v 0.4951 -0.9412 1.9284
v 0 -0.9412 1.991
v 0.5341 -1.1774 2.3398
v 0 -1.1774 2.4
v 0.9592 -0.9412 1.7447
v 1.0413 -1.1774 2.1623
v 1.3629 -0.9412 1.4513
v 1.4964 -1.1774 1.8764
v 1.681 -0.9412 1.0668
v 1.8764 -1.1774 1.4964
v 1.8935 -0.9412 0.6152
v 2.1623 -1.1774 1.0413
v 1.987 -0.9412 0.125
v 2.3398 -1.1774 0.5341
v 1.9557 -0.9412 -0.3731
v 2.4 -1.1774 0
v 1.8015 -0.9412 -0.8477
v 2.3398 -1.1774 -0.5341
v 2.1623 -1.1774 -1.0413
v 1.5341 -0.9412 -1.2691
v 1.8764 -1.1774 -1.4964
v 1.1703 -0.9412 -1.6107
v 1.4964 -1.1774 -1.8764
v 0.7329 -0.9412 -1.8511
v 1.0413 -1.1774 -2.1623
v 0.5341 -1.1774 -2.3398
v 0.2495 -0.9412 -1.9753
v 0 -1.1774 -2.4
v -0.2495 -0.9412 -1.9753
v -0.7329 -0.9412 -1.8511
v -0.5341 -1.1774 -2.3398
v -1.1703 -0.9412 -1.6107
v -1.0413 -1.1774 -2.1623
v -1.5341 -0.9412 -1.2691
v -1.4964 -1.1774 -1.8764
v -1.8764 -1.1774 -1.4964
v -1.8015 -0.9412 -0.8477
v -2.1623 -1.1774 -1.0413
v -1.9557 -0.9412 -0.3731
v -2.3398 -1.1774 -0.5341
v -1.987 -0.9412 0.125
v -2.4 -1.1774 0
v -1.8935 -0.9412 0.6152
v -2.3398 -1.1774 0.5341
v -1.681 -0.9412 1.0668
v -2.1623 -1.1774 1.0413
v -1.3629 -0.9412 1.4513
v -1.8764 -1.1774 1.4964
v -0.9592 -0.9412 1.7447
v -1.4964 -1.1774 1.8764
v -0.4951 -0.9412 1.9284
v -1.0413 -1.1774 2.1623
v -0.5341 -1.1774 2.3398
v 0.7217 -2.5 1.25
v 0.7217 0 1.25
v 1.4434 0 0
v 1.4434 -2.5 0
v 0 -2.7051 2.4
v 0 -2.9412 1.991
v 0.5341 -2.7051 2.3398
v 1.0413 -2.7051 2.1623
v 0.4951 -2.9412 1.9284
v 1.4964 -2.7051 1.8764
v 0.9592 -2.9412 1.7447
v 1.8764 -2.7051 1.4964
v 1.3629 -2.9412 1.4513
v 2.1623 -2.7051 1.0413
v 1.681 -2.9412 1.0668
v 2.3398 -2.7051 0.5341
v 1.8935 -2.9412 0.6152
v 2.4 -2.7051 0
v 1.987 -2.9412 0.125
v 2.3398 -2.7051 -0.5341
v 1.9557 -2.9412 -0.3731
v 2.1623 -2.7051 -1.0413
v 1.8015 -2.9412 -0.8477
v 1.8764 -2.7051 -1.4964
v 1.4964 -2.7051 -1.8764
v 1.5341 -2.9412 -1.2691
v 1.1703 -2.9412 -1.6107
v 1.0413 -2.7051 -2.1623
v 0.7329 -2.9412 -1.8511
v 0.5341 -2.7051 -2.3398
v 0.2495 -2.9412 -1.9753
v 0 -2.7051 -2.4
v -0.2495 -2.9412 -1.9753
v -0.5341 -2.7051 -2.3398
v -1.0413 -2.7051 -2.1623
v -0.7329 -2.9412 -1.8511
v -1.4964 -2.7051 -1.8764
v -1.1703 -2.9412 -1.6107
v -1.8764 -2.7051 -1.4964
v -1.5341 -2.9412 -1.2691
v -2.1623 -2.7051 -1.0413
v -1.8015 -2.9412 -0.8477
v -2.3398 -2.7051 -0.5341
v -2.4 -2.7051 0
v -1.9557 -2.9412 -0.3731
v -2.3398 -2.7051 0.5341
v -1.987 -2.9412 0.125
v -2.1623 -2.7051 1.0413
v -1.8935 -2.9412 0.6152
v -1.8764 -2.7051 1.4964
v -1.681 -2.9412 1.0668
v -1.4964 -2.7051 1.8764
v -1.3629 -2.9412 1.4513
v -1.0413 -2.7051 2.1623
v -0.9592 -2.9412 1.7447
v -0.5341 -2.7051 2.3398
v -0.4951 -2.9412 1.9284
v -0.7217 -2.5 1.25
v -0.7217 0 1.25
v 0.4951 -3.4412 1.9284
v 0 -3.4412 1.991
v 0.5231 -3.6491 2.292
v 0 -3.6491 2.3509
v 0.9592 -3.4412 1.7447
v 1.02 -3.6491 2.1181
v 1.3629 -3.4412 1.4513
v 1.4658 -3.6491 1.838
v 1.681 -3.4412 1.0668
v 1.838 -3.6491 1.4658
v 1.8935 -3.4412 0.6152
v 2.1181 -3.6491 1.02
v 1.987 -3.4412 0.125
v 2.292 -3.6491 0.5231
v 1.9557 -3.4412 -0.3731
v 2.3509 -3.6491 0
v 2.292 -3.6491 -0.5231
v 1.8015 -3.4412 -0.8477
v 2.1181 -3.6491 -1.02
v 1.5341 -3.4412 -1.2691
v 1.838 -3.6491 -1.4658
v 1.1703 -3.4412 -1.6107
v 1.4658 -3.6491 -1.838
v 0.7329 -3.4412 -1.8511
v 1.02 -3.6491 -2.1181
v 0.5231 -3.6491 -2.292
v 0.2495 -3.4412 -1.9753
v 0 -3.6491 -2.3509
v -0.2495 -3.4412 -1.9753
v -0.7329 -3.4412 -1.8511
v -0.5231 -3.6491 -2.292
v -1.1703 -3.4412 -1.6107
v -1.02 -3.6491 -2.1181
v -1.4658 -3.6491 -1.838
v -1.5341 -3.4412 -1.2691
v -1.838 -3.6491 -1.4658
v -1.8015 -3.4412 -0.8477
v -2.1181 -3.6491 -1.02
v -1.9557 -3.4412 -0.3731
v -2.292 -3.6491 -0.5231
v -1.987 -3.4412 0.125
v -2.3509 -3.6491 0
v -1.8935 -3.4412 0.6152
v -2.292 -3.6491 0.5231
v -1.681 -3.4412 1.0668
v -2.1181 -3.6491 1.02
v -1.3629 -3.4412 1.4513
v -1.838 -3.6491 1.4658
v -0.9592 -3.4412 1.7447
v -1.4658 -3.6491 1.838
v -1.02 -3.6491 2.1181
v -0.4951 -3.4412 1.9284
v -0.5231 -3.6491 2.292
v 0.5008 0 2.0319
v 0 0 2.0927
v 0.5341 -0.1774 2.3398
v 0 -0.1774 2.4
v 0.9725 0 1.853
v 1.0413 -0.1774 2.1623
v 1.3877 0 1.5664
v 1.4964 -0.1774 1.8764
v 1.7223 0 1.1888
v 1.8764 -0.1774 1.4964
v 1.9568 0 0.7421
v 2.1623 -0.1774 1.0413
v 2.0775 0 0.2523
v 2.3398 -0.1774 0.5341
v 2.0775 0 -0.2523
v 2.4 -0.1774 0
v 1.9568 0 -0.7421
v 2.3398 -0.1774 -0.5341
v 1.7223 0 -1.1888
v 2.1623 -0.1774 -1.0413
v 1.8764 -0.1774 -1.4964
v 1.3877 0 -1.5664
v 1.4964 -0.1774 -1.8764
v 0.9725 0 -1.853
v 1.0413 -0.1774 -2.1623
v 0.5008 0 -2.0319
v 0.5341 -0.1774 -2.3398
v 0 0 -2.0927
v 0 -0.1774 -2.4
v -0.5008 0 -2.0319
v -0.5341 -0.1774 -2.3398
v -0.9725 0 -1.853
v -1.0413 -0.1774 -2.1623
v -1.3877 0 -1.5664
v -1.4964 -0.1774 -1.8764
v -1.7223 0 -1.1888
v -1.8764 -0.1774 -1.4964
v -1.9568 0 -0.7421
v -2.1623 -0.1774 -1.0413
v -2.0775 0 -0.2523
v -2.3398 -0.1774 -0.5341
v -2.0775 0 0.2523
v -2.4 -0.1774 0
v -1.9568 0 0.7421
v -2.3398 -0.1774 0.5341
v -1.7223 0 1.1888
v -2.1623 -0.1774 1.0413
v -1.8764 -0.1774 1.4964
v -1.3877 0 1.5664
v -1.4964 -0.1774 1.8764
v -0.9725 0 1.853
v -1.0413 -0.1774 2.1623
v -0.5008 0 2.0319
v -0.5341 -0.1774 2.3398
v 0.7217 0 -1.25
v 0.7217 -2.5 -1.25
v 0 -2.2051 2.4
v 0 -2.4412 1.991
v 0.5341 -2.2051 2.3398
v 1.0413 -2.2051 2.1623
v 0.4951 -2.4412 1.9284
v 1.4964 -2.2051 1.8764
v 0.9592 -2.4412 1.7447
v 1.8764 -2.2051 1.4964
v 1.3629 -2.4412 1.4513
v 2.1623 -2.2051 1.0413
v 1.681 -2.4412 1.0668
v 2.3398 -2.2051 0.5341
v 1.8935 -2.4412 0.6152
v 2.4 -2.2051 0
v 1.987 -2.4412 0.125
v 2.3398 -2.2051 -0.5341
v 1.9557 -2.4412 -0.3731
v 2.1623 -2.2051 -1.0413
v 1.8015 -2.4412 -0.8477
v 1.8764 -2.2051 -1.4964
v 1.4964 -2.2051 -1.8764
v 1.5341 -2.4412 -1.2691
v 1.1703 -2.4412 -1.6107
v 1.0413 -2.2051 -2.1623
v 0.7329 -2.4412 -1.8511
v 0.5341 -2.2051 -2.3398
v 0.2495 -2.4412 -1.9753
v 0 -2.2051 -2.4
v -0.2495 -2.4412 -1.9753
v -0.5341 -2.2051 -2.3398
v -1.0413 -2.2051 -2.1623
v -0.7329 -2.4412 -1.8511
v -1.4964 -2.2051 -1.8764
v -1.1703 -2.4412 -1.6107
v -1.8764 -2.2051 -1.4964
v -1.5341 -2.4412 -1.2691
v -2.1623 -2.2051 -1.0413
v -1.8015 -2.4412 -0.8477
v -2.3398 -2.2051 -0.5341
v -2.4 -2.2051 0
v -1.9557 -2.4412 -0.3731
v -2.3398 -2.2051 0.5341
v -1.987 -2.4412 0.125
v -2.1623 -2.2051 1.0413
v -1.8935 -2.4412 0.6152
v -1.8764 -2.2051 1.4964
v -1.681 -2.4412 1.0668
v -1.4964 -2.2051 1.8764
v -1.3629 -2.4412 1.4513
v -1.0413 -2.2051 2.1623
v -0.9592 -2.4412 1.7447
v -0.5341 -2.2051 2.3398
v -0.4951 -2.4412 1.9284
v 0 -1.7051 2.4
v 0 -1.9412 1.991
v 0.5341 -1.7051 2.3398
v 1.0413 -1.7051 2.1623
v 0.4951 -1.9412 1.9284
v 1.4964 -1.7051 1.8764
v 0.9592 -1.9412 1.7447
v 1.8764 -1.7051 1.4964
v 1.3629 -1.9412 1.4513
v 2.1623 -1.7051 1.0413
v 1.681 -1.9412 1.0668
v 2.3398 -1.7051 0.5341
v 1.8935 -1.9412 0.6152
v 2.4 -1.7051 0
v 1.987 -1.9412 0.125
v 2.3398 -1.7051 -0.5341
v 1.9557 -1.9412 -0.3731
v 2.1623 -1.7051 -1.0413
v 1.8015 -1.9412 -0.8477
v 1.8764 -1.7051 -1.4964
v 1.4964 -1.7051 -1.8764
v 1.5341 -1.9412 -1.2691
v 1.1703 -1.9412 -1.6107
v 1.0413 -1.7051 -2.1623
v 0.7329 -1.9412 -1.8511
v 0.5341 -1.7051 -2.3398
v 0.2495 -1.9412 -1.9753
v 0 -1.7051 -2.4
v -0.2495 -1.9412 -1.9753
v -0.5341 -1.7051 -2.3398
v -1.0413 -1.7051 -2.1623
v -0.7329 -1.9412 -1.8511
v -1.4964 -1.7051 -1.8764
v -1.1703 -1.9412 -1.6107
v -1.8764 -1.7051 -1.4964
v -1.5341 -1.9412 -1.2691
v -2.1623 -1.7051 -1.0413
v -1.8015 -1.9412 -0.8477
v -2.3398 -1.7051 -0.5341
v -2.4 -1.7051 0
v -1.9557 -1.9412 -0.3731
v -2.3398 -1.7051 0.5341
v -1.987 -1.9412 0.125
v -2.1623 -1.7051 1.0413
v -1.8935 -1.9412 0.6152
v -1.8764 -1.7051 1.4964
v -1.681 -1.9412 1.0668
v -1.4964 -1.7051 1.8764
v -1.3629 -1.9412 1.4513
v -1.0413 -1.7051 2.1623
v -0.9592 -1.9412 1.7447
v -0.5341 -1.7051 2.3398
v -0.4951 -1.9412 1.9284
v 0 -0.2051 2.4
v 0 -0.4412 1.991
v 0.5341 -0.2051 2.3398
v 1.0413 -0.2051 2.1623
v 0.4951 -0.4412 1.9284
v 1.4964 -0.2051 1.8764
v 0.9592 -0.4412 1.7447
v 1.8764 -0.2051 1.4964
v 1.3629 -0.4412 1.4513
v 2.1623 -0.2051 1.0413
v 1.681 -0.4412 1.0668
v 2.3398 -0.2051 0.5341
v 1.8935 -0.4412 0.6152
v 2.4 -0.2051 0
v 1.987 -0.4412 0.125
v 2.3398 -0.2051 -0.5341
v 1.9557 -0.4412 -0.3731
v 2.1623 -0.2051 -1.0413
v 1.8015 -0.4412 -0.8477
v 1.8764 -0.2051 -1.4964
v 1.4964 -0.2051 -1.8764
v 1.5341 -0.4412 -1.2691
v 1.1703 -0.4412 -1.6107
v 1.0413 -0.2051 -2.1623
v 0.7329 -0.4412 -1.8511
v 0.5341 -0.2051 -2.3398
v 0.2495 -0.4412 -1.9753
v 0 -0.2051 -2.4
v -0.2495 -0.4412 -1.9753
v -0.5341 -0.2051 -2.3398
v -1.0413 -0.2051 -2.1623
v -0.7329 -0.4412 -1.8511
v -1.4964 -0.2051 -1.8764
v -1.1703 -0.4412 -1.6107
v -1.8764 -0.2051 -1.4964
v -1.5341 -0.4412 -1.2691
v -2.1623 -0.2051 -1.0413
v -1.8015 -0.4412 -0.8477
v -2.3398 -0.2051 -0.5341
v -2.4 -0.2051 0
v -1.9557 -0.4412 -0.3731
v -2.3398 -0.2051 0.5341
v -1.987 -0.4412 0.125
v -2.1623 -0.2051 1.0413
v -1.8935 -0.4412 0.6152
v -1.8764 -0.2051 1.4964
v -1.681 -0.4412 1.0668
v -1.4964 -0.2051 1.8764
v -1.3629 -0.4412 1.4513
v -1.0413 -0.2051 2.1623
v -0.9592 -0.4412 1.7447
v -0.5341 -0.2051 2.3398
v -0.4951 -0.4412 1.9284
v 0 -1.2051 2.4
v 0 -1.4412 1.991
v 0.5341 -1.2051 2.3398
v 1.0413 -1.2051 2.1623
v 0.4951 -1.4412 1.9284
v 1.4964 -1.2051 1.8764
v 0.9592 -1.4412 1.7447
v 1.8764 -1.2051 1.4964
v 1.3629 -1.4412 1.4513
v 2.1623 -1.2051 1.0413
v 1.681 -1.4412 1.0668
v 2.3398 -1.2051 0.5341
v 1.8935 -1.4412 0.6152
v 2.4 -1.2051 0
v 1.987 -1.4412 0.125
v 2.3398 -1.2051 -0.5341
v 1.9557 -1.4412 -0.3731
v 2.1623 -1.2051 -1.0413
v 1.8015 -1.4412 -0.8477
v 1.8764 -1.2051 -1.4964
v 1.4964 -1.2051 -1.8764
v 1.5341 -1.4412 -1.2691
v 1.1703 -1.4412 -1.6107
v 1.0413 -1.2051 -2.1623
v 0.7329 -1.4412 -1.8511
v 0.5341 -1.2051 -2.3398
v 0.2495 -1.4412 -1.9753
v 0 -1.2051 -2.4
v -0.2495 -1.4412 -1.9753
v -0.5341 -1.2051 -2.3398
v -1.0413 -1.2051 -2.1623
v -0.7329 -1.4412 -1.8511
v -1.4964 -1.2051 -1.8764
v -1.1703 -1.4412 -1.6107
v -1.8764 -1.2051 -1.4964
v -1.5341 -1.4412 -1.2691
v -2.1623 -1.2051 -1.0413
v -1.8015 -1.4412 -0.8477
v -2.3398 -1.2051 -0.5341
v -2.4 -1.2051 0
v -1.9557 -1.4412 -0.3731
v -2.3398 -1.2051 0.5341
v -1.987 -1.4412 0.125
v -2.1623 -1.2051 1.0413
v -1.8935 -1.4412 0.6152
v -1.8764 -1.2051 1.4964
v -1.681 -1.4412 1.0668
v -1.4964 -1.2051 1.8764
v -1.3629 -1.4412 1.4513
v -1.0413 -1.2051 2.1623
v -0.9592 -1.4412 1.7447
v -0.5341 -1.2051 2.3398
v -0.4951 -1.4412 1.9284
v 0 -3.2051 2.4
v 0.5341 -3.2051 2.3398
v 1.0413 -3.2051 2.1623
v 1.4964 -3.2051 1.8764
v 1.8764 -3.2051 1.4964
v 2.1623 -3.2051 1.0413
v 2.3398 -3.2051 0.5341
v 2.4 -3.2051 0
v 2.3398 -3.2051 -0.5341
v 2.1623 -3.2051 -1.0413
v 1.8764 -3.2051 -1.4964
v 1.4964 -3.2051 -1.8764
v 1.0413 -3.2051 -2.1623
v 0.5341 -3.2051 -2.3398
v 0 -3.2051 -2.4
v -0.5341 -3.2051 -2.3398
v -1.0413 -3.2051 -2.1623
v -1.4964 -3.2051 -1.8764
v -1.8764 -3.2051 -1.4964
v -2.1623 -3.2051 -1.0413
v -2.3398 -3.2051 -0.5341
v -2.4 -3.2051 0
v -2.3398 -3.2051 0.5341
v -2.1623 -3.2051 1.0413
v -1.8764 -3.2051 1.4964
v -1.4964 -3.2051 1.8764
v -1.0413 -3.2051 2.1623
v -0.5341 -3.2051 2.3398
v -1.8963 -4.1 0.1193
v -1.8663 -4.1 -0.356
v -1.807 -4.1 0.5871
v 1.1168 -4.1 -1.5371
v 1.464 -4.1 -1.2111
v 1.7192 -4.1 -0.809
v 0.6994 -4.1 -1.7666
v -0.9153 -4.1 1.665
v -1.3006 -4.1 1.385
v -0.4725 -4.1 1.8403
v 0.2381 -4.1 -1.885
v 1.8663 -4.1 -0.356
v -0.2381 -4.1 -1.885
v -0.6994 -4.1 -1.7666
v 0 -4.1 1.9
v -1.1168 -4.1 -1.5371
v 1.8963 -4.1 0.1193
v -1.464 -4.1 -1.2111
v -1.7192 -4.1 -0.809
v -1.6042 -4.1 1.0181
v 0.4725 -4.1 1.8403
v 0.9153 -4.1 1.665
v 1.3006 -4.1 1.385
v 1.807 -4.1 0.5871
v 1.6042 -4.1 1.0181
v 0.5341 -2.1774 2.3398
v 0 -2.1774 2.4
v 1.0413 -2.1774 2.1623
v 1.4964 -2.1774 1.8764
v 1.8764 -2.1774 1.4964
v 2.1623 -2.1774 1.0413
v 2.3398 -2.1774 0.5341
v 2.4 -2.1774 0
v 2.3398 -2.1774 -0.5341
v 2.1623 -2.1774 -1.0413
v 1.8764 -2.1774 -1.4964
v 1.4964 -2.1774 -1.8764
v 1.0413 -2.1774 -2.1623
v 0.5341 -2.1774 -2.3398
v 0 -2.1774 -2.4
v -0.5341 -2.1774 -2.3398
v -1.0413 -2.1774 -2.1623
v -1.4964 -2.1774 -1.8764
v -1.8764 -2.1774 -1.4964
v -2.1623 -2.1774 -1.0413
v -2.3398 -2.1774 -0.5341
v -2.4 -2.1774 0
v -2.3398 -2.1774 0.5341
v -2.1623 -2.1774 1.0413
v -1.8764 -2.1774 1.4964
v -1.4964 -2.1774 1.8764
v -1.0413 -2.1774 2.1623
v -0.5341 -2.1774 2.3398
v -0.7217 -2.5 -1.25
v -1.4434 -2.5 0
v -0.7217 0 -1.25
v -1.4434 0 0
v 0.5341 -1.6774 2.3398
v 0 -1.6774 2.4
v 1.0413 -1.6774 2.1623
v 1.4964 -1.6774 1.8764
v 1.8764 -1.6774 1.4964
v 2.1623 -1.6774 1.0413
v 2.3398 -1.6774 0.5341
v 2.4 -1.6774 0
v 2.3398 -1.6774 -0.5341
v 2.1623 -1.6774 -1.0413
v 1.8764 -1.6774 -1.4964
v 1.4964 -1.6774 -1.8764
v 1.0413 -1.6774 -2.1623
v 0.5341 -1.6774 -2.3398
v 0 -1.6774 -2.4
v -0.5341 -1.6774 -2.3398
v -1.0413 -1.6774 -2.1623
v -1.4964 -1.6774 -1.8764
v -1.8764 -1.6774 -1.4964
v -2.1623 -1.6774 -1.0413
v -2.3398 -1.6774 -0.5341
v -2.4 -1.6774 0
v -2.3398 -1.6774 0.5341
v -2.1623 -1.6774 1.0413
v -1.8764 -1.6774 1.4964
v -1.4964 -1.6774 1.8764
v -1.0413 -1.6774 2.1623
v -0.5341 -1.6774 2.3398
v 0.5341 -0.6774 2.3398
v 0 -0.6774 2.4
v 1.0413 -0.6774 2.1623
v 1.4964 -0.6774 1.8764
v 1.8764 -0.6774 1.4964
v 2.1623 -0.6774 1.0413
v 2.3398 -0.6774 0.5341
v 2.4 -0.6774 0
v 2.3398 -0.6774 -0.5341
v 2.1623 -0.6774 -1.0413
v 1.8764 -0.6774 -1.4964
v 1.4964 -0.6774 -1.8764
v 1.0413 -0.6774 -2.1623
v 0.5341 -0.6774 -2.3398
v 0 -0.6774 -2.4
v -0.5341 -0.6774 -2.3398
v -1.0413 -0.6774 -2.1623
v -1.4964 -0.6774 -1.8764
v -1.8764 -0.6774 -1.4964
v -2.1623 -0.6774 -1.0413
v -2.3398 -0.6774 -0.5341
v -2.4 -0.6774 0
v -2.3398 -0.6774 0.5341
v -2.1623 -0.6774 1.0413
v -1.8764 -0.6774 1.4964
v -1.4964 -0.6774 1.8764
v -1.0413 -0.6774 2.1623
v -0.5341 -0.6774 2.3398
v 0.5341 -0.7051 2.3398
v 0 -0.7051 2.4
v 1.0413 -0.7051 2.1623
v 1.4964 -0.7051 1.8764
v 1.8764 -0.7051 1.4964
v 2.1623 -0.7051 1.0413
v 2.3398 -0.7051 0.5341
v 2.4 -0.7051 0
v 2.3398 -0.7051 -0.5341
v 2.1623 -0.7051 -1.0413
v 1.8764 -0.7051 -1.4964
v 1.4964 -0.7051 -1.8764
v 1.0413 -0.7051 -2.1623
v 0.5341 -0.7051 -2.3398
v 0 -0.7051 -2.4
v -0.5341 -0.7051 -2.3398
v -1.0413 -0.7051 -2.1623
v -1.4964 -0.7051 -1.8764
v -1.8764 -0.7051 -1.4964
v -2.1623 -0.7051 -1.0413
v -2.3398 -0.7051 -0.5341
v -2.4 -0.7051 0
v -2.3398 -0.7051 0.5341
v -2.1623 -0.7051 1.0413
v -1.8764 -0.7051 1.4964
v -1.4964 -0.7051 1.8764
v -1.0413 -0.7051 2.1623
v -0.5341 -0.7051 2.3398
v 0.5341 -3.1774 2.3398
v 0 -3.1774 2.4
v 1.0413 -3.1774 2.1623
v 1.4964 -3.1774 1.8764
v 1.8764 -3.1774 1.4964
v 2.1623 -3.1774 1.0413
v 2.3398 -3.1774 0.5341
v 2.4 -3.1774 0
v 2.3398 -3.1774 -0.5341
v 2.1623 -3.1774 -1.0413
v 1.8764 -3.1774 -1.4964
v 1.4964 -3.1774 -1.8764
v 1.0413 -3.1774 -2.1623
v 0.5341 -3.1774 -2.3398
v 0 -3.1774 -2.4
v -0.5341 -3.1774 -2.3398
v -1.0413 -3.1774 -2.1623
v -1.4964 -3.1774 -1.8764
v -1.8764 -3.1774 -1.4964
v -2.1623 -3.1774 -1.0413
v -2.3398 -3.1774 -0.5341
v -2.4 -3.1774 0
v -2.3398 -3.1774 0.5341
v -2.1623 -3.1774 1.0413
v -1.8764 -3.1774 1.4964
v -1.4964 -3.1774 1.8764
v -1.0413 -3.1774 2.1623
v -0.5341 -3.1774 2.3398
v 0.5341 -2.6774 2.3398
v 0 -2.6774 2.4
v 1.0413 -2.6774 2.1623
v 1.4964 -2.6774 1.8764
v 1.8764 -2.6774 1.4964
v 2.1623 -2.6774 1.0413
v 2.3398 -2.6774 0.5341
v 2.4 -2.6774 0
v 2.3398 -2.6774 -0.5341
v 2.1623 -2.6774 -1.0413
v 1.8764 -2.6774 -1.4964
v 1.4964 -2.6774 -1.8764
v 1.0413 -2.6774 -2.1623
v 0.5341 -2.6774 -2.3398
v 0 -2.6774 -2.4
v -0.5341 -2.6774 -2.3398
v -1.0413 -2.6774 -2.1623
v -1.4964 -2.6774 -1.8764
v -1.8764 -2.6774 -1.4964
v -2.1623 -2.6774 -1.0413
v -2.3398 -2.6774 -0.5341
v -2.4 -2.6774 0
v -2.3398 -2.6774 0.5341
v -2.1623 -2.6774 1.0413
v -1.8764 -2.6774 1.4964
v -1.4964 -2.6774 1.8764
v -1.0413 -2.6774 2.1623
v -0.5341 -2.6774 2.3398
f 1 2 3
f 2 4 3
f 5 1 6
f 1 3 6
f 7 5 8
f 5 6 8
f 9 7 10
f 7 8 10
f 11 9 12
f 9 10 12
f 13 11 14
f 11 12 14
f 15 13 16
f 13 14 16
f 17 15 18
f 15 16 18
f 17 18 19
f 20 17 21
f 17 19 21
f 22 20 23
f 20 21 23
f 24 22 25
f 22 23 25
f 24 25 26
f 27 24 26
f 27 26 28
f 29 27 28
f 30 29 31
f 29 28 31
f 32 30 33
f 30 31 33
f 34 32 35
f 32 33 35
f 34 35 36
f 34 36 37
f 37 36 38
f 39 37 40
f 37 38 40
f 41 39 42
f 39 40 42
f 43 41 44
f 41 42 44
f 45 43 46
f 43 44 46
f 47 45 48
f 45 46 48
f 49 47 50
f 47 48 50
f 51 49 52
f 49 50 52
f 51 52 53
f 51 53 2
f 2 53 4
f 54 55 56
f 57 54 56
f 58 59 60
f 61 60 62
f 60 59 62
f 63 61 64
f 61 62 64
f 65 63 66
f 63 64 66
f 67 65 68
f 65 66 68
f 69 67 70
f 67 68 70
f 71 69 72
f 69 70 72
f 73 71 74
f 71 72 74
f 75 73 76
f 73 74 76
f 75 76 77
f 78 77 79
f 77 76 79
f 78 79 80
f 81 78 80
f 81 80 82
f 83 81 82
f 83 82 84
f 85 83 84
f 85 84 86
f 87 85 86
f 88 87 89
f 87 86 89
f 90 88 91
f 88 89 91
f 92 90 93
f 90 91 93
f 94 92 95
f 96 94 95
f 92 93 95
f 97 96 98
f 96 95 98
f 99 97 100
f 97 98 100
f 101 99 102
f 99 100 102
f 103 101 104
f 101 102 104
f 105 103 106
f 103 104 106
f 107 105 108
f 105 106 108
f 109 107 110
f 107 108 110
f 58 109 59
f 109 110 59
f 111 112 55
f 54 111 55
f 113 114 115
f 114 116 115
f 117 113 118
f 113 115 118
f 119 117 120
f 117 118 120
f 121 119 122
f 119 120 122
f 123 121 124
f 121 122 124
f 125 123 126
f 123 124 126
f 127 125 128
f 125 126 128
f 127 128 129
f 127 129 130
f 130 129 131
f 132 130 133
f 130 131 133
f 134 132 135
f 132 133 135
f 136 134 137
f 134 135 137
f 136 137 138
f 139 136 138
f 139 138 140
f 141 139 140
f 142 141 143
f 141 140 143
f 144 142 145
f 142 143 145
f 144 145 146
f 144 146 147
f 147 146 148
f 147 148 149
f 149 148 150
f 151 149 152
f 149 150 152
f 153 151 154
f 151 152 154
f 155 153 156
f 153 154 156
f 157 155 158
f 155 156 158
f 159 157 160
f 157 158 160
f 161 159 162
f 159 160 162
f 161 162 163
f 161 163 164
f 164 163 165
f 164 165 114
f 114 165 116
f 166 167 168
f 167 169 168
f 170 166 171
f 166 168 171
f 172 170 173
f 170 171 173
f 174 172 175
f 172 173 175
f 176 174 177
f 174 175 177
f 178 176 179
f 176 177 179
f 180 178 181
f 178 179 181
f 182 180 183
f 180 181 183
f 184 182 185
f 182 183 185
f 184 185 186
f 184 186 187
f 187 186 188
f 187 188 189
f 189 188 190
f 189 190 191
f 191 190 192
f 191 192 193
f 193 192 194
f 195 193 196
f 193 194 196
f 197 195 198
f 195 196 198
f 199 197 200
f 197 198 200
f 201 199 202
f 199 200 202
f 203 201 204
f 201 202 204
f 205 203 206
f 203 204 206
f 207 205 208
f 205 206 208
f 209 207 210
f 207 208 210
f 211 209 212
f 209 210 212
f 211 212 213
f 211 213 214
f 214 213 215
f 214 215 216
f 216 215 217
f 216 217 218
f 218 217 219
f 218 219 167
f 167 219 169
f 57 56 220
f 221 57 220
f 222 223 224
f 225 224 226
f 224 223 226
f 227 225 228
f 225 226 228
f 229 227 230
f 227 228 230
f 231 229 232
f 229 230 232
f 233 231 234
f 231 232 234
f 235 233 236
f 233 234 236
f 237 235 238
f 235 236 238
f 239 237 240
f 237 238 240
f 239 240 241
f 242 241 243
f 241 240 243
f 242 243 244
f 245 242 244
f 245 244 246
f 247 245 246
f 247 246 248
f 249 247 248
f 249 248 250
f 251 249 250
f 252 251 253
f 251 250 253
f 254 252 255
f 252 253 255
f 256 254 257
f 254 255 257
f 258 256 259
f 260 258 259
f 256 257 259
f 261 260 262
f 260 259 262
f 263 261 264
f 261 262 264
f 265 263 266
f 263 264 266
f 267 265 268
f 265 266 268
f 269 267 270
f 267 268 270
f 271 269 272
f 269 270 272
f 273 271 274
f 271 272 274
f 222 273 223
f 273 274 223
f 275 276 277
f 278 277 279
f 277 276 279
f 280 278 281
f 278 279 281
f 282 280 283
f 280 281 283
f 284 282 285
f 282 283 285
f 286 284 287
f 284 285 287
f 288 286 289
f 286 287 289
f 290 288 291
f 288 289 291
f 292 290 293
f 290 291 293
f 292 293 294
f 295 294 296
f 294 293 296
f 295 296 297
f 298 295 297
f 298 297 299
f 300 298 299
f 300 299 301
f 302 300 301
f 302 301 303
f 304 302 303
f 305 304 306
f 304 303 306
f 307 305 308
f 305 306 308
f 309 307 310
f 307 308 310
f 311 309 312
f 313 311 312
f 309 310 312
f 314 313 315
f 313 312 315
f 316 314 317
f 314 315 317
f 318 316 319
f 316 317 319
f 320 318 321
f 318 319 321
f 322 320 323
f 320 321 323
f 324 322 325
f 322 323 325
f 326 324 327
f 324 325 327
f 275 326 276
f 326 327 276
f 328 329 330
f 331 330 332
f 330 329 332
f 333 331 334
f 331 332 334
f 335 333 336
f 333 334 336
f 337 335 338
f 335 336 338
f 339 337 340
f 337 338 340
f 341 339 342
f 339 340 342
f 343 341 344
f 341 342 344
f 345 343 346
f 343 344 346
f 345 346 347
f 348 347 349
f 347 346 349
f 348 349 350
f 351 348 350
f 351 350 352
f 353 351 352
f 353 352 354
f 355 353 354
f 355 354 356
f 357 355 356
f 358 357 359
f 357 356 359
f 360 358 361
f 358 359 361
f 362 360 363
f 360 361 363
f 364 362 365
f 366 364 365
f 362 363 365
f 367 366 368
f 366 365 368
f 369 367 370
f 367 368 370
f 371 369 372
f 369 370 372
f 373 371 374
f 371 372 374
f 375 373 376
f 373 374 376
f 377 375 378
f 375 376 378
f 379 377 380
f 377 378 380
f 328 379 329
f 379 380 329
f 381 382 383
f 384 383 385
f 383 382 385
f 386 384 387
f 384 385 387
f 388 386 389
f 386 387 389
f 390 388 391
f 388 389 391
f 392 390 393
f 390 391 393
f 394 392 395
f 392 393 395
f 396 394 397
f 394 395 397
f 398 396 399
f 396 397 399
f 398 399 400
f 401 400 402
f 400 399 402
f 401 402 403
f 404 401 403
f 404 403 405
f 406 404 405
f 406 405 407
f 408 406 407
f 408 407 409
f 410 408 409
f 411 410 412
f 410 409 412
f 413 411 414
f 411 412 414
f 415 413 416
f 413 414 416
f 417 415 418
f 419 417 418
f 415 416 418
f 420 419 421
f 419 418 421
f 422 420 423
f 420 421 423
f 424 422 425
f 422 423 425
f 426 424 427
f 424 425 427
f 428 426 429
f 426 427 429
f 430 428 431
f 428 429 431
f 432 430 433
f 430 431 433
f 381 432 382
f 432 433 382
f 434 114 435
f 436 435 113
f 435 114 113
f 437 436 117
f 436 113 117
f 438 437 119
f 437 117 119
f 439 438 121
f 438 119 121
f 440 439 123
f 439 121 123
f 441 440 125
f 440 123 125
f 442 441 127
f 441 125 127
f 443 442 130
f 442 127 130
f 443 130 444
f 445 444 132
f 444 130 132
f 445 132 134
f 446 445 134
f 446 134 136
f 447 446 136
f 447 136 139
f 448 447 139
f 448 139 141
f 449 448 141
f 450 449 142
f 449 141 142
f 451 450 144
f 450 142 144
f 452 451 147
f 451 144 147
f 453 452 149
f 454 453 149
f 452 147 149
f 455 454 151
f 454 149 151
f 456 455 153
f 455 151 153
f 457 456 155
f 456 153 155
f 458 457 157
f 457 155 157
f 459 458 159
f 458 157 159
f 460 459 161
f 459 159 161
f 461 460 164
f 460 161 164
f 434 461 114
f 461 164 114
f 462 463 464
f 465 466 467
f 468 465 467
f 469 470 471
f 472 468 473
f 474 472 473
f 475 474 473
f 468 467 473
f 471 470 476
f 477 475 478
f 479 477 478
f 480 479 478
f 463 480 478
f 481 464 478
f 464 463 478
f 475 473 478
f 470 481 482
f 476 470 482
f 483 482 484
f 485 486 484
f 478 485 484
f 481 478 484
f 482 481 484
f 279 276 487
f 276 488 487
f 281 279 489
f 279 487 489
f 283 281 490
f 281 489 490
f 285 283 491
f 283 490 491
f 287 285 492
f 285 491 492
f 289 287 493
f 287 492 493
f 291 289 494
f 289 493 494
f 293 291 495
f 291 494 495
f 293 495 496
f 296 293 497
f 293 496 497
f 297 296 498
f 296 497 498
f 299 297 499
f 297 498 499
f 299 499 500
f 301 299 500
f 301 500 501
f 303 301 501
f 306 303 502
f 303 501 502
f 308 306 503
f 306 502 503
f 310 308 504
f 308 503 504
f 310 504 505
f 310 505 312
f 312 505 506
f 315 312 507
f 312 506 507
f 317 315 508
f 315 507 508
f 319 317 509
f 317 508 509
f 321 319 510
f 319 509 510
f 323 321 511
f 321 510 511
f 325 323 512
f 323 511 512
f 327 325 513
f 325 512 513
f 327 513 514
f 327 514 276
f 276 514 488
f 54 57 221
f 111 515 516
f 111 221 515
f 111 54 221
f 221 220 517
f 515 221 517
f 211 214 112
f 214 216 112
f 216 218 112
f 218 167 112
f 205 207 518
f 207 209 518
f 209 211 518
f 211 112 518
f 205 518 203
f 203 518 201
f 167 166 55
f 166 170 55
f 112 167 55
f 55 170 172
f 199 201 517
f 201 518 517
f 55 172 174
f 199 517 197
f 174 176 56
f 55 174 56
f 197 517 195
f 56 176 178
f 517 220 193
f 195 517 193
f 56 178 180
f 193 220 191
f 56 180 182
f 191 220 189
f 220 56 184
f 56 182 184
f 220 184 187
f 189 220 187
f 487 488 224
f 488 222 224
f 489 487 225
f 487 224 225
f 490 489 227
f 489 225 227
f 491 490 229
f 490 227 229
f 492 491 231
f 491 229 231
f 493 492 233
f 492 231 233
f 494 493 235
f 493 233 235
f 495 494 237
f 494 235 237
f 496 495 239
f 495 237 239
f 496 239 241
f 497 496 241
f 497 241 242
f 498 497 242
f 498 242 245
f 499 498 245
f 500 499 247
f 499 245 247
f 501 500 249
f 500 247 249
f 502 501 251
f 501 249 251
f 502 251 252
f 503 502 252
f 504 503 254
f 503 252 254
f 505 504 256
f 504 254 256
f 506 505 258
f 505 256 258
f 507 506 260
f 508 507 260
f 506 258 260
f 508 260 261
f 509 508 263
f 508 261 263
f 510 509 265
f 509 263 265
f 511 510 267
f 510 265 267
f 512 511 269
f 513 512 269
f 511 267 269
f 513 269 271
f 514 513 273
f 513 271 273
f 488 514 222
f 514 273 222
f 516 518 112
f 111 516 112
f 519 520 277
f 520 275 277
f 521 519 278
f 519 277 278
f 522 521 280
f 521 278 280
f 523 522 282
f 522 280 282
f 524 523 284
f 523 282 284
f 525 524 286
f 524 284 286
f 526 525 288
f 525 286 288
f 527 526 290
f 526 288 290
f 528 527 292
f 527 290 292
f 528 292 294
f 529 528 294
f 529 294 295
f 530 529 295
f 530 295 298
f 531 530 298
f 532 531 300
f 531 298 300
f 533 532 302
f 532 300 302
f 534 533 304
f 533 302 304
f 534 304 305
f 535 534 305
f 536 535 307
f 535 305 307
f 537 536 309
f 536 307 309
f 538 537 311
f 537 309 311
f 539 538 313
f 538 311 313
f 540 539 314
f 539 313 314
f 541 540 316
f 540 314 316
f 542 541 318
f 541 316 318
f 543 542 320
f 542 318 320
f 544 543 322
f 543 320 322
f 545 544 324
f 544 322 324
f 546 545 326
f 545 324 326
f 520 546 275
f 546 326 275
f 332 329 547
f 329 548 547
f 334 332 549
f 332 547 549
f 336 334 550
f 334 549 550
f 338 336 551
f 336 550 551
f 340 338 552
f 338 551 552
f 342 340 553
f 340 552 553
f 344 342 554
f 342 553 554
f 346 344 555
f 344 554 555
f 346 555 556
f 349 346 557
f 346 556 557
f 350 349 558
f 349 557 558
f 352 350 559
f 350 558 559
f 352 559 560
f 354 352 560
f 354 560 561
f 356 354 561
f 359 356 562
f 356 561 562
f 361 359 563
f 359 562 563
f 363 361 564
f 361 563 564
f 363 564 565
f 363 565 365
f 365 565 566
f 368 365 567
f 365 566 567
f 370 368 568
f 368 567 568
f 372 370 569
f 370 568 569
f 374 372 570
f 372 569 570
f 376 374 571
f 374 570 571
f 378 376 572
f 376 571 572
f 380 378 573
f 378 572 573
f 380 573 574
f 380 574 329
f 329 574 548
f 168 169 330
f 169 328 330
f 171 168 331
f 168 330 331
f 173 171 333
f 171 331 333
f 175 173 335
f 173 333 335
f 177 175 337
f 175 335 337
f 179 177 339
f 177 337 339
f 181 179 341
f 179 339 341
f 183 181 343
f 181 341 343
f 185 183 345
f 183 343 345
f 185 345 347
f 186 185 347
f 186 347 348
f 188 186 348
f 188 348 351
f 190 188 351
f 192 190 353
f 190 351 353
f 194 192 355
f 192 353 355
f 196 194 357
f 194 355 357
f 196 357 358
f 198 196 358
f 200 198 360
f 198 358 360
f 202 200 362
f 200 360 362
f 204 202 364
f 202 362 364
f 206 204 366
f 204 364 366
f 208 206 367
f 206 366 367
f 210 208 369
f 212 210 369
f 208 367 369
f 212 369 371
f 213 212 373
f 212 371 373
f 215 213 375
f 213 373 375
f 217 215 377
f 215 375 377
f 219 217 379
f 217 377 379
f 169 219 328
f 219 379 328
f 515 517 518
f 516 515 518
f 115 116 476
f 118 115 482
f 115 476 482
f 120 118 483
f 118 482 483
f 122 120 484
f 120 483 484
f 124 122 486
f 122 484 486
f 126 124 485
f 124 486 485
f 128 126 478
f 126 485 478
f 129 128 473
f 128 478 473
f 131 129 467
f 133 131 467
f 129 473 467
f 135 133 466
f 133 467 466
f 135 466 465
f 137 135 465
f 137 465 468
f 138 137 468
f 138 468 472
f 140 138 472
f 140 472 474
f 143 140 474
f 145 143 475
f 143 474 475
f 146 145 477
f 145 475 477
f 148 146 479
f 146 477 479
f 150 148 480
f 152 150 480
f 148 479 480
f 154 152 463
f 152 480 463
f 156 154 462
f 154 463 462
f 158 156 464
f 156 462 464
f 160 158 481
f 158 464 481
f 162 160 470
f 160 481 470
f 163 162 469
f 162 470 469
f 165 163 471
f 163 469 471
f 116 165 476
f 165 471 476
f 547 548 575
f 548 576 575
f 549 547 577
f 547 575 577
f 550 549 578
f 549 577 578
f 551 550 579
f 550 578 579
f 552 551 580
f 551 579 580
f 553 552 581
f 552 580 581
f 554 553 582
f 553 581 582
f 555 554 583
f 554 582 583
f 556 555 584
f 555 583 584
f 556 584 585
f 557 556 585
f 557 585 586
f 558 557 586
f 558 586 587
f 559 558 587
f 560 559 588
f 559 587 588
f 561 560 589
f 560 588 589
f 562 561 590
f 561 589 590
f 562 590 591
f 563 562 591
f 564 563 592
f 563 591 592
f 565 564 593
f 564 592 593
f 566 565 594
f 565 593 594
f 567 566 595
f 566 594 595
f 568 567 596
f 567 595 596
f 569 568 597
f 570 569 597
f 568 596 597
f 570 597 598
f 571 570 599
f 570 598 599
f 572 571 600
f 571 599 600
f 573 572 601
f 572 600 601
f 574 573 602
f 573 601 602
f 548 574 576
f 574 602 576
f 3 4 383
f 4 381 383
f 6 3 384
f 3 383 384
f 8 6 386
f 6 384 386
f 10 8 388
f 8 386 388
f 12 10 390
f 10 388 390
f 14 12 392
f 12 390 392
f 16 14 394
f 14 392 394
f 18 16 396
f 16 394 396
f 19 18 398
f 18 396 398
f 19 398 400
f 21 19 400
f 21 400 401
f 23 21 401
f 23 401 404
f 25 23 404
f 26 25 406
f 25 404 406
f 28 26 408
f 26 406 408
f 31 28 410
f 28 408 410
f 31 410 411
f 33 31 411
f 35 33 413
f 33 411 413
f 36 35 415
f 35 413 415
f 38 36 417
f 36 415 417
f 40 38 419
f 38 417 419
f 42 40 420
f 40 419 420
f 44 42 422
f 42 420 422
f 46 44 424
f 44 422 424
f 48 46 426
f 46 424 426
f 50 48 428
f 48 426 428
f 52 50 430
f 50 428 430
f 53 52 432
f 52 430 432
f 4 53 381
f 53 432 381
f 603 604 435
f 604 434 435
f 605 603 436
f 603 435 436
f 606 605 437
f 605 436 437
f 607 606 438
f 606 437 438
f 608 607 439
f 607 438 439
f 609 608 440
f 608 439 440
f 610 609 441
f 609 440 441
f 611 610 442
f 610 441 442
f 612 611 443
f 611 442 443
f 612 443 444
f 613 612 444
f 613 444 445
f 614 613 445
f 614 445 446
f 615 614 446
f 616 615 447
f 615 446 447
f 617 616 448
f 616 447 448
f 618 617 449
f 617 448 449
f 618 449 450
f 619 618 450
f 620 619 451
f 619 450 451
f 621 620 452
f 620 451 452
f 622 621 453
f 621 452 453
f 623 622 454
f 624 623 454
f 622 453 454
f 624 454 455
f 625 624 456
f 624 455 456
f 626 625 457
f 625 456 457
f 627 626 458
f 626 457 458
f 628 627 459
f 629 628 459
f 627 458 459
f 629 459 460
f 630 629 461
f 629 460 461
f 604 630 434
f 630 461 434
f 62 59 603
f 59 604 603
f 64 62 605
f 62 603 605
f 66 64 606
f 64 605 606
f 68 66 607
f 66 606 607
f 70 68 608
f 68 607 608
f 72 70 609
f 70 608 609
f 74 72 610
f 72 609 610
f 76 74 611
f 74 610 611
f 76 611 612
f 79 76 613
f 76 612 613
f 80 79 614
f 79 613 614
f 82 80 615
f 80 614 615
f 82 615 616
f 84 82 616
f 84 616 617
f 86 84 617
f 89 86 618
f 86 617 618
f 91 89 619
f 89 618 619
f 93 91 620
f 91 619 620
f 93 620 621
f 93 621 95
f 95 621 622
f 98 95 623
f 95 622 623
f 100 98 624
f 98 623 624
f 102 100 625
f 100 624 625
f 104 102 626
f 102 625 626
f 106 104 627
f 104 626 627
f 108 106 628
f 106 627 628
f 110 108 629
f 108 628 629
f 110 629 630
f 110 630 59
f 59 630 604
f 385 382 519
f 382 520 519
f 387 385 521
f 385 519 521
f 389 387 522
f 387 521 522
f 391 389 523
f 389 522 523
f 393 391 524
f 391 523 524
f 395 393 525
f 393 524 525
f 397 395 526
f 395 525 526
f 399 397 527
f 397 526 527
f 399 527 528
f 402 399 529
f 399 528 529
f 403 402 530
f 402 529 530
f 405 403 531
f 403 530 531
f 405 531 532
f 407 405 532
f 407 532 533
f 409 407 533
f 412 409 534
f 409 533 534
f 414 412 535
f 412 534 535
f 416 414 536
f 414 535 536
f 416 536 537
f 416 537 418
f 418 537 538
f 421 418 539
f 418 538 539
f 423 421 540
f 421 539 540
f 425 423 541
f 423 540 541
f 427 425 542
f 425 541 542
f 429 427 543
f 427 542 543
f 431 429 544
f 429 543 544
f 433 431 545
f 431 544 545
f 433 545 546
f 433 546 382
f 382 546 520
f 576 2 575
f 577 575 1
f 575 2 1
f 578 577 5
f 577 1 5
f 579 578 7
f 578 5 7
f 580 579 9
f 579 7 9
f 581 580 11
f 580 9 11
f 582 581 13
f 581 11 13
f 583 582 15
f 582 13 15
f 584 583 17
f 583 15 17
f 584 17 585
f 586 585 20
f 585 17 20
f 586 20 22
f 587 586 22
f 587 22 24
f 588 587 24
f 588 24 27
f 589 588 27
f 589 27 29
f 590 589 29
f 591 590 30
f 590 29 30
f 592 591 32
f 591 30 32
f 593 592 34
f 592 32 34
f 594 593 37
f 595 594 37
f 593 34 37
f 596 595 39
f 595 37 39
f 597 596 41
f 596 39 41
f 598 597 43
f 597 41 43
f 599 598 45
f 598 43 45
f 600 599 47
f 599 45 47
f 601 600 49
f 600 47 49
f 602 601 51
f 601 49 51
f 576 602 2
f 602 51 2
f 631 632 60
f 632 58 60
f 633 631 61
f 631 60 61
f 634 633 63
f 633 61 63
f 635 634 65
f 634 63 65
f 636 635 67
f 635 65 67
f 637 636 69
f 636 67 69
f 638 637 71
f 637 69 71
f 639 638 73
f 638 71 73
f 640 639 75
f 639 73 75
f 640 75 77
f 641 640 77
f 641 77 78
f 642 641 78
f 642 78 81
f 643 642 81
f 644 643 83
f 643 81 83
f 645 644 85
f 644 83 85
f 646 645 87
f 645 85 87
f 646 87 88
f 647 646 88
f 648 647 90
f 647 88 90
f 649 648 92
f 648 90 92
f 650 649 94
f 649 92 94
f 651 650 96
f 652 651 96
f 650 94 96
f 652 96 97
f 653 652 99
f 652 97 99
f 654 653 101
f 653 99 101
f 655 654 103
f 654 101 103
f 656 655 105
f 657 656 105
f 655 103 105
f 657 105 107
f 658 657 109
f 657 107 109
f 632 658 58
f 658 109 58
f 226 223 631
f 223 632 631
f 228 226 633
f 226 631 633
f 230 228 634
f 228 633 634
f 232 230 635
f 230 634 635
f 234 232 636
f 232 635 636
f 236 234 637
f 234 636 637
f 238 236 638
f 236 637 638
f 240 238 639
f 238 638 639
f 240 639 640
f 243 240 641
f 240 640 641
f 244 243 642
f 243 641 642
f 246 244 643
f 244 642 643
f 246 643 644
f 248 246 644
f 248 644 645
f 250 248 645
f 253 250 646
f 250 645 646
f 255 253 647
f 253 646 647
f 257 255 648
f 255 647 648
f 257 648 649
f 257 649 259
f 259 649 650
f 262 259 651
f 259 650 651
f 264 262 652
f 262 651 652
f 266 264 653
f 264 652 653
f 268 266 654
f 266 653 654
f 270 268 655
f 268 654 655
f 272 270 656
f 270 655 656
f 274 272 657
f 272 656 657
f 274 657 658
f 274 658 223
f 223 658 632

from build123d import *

# Parameters (mm, degrees)
CUT_EXTRUDE1_DEPTH = 2.5


with BuildPart() as part:
    # Sketch1 → Revolve1 (revolve)
    with BuildSketch(Plane(origin=(0, 0, 0), x_dir=(-1, 0, 0), z_dir=(0, 0, -1)), mode=Mode.PRIVATE) as revolve1_sk:
        Polygon((-1.9, -4.1), (0, -4.1), (0, 0), (-2.092745595, 0), (-2.4, -0.177393414), (-2.4, -0.205075547), (-1.990960729, -0.441234481), (-2.4, -0.677393414), (-2.4, -0.705075547), (-1.990960729, -0.941234481), (-2.4, -1.177393414), (-2.4, -1.205075547), (-1.990960729, -1.441234481), (-2.4, -1.677393414), (-2.4, -1.705075547), (-1.990960729, -1.94123448), (-2.4, -2.177393414), (-2.4, -2.205075547), (-1.990960729, -2.44123448), (-2.4, -2.677393414), (-2.4, -2.705075547), (-1.990960729, -2.941234481), (-2.4, -3.177393414), (-2.4, -3.205075547), (-1.990960729, -3.441234481), (-2.350934542, -3.649065458), align=None)
    revolve(revolve1_sk.sketch.rotate(Axis((0, -4.1, 0), (0, 1, 0)), 270), axis=Axis((0, -4.1, 0), (0, 1, 0)))

    # Sketch2 → Cut-Extrude1 (cut)
    with BuildSketch(Plane(origin=(0, 0, 0), x_dir=(-1, 0, 0), z_dir=(0, 1, 0))):
        Polygon((0.721687836, -1.25), (1.443375673, 0), (0.721687836, 1.25), (-0.721687836, 1.25), (-1.443375673, 0), (-0.721687836, -1.25), align=None)
    extrude(amount=-CUT_EXTRUDE1_DEPTH, mode=Mode.SUBTRACT)


solid = part.part
